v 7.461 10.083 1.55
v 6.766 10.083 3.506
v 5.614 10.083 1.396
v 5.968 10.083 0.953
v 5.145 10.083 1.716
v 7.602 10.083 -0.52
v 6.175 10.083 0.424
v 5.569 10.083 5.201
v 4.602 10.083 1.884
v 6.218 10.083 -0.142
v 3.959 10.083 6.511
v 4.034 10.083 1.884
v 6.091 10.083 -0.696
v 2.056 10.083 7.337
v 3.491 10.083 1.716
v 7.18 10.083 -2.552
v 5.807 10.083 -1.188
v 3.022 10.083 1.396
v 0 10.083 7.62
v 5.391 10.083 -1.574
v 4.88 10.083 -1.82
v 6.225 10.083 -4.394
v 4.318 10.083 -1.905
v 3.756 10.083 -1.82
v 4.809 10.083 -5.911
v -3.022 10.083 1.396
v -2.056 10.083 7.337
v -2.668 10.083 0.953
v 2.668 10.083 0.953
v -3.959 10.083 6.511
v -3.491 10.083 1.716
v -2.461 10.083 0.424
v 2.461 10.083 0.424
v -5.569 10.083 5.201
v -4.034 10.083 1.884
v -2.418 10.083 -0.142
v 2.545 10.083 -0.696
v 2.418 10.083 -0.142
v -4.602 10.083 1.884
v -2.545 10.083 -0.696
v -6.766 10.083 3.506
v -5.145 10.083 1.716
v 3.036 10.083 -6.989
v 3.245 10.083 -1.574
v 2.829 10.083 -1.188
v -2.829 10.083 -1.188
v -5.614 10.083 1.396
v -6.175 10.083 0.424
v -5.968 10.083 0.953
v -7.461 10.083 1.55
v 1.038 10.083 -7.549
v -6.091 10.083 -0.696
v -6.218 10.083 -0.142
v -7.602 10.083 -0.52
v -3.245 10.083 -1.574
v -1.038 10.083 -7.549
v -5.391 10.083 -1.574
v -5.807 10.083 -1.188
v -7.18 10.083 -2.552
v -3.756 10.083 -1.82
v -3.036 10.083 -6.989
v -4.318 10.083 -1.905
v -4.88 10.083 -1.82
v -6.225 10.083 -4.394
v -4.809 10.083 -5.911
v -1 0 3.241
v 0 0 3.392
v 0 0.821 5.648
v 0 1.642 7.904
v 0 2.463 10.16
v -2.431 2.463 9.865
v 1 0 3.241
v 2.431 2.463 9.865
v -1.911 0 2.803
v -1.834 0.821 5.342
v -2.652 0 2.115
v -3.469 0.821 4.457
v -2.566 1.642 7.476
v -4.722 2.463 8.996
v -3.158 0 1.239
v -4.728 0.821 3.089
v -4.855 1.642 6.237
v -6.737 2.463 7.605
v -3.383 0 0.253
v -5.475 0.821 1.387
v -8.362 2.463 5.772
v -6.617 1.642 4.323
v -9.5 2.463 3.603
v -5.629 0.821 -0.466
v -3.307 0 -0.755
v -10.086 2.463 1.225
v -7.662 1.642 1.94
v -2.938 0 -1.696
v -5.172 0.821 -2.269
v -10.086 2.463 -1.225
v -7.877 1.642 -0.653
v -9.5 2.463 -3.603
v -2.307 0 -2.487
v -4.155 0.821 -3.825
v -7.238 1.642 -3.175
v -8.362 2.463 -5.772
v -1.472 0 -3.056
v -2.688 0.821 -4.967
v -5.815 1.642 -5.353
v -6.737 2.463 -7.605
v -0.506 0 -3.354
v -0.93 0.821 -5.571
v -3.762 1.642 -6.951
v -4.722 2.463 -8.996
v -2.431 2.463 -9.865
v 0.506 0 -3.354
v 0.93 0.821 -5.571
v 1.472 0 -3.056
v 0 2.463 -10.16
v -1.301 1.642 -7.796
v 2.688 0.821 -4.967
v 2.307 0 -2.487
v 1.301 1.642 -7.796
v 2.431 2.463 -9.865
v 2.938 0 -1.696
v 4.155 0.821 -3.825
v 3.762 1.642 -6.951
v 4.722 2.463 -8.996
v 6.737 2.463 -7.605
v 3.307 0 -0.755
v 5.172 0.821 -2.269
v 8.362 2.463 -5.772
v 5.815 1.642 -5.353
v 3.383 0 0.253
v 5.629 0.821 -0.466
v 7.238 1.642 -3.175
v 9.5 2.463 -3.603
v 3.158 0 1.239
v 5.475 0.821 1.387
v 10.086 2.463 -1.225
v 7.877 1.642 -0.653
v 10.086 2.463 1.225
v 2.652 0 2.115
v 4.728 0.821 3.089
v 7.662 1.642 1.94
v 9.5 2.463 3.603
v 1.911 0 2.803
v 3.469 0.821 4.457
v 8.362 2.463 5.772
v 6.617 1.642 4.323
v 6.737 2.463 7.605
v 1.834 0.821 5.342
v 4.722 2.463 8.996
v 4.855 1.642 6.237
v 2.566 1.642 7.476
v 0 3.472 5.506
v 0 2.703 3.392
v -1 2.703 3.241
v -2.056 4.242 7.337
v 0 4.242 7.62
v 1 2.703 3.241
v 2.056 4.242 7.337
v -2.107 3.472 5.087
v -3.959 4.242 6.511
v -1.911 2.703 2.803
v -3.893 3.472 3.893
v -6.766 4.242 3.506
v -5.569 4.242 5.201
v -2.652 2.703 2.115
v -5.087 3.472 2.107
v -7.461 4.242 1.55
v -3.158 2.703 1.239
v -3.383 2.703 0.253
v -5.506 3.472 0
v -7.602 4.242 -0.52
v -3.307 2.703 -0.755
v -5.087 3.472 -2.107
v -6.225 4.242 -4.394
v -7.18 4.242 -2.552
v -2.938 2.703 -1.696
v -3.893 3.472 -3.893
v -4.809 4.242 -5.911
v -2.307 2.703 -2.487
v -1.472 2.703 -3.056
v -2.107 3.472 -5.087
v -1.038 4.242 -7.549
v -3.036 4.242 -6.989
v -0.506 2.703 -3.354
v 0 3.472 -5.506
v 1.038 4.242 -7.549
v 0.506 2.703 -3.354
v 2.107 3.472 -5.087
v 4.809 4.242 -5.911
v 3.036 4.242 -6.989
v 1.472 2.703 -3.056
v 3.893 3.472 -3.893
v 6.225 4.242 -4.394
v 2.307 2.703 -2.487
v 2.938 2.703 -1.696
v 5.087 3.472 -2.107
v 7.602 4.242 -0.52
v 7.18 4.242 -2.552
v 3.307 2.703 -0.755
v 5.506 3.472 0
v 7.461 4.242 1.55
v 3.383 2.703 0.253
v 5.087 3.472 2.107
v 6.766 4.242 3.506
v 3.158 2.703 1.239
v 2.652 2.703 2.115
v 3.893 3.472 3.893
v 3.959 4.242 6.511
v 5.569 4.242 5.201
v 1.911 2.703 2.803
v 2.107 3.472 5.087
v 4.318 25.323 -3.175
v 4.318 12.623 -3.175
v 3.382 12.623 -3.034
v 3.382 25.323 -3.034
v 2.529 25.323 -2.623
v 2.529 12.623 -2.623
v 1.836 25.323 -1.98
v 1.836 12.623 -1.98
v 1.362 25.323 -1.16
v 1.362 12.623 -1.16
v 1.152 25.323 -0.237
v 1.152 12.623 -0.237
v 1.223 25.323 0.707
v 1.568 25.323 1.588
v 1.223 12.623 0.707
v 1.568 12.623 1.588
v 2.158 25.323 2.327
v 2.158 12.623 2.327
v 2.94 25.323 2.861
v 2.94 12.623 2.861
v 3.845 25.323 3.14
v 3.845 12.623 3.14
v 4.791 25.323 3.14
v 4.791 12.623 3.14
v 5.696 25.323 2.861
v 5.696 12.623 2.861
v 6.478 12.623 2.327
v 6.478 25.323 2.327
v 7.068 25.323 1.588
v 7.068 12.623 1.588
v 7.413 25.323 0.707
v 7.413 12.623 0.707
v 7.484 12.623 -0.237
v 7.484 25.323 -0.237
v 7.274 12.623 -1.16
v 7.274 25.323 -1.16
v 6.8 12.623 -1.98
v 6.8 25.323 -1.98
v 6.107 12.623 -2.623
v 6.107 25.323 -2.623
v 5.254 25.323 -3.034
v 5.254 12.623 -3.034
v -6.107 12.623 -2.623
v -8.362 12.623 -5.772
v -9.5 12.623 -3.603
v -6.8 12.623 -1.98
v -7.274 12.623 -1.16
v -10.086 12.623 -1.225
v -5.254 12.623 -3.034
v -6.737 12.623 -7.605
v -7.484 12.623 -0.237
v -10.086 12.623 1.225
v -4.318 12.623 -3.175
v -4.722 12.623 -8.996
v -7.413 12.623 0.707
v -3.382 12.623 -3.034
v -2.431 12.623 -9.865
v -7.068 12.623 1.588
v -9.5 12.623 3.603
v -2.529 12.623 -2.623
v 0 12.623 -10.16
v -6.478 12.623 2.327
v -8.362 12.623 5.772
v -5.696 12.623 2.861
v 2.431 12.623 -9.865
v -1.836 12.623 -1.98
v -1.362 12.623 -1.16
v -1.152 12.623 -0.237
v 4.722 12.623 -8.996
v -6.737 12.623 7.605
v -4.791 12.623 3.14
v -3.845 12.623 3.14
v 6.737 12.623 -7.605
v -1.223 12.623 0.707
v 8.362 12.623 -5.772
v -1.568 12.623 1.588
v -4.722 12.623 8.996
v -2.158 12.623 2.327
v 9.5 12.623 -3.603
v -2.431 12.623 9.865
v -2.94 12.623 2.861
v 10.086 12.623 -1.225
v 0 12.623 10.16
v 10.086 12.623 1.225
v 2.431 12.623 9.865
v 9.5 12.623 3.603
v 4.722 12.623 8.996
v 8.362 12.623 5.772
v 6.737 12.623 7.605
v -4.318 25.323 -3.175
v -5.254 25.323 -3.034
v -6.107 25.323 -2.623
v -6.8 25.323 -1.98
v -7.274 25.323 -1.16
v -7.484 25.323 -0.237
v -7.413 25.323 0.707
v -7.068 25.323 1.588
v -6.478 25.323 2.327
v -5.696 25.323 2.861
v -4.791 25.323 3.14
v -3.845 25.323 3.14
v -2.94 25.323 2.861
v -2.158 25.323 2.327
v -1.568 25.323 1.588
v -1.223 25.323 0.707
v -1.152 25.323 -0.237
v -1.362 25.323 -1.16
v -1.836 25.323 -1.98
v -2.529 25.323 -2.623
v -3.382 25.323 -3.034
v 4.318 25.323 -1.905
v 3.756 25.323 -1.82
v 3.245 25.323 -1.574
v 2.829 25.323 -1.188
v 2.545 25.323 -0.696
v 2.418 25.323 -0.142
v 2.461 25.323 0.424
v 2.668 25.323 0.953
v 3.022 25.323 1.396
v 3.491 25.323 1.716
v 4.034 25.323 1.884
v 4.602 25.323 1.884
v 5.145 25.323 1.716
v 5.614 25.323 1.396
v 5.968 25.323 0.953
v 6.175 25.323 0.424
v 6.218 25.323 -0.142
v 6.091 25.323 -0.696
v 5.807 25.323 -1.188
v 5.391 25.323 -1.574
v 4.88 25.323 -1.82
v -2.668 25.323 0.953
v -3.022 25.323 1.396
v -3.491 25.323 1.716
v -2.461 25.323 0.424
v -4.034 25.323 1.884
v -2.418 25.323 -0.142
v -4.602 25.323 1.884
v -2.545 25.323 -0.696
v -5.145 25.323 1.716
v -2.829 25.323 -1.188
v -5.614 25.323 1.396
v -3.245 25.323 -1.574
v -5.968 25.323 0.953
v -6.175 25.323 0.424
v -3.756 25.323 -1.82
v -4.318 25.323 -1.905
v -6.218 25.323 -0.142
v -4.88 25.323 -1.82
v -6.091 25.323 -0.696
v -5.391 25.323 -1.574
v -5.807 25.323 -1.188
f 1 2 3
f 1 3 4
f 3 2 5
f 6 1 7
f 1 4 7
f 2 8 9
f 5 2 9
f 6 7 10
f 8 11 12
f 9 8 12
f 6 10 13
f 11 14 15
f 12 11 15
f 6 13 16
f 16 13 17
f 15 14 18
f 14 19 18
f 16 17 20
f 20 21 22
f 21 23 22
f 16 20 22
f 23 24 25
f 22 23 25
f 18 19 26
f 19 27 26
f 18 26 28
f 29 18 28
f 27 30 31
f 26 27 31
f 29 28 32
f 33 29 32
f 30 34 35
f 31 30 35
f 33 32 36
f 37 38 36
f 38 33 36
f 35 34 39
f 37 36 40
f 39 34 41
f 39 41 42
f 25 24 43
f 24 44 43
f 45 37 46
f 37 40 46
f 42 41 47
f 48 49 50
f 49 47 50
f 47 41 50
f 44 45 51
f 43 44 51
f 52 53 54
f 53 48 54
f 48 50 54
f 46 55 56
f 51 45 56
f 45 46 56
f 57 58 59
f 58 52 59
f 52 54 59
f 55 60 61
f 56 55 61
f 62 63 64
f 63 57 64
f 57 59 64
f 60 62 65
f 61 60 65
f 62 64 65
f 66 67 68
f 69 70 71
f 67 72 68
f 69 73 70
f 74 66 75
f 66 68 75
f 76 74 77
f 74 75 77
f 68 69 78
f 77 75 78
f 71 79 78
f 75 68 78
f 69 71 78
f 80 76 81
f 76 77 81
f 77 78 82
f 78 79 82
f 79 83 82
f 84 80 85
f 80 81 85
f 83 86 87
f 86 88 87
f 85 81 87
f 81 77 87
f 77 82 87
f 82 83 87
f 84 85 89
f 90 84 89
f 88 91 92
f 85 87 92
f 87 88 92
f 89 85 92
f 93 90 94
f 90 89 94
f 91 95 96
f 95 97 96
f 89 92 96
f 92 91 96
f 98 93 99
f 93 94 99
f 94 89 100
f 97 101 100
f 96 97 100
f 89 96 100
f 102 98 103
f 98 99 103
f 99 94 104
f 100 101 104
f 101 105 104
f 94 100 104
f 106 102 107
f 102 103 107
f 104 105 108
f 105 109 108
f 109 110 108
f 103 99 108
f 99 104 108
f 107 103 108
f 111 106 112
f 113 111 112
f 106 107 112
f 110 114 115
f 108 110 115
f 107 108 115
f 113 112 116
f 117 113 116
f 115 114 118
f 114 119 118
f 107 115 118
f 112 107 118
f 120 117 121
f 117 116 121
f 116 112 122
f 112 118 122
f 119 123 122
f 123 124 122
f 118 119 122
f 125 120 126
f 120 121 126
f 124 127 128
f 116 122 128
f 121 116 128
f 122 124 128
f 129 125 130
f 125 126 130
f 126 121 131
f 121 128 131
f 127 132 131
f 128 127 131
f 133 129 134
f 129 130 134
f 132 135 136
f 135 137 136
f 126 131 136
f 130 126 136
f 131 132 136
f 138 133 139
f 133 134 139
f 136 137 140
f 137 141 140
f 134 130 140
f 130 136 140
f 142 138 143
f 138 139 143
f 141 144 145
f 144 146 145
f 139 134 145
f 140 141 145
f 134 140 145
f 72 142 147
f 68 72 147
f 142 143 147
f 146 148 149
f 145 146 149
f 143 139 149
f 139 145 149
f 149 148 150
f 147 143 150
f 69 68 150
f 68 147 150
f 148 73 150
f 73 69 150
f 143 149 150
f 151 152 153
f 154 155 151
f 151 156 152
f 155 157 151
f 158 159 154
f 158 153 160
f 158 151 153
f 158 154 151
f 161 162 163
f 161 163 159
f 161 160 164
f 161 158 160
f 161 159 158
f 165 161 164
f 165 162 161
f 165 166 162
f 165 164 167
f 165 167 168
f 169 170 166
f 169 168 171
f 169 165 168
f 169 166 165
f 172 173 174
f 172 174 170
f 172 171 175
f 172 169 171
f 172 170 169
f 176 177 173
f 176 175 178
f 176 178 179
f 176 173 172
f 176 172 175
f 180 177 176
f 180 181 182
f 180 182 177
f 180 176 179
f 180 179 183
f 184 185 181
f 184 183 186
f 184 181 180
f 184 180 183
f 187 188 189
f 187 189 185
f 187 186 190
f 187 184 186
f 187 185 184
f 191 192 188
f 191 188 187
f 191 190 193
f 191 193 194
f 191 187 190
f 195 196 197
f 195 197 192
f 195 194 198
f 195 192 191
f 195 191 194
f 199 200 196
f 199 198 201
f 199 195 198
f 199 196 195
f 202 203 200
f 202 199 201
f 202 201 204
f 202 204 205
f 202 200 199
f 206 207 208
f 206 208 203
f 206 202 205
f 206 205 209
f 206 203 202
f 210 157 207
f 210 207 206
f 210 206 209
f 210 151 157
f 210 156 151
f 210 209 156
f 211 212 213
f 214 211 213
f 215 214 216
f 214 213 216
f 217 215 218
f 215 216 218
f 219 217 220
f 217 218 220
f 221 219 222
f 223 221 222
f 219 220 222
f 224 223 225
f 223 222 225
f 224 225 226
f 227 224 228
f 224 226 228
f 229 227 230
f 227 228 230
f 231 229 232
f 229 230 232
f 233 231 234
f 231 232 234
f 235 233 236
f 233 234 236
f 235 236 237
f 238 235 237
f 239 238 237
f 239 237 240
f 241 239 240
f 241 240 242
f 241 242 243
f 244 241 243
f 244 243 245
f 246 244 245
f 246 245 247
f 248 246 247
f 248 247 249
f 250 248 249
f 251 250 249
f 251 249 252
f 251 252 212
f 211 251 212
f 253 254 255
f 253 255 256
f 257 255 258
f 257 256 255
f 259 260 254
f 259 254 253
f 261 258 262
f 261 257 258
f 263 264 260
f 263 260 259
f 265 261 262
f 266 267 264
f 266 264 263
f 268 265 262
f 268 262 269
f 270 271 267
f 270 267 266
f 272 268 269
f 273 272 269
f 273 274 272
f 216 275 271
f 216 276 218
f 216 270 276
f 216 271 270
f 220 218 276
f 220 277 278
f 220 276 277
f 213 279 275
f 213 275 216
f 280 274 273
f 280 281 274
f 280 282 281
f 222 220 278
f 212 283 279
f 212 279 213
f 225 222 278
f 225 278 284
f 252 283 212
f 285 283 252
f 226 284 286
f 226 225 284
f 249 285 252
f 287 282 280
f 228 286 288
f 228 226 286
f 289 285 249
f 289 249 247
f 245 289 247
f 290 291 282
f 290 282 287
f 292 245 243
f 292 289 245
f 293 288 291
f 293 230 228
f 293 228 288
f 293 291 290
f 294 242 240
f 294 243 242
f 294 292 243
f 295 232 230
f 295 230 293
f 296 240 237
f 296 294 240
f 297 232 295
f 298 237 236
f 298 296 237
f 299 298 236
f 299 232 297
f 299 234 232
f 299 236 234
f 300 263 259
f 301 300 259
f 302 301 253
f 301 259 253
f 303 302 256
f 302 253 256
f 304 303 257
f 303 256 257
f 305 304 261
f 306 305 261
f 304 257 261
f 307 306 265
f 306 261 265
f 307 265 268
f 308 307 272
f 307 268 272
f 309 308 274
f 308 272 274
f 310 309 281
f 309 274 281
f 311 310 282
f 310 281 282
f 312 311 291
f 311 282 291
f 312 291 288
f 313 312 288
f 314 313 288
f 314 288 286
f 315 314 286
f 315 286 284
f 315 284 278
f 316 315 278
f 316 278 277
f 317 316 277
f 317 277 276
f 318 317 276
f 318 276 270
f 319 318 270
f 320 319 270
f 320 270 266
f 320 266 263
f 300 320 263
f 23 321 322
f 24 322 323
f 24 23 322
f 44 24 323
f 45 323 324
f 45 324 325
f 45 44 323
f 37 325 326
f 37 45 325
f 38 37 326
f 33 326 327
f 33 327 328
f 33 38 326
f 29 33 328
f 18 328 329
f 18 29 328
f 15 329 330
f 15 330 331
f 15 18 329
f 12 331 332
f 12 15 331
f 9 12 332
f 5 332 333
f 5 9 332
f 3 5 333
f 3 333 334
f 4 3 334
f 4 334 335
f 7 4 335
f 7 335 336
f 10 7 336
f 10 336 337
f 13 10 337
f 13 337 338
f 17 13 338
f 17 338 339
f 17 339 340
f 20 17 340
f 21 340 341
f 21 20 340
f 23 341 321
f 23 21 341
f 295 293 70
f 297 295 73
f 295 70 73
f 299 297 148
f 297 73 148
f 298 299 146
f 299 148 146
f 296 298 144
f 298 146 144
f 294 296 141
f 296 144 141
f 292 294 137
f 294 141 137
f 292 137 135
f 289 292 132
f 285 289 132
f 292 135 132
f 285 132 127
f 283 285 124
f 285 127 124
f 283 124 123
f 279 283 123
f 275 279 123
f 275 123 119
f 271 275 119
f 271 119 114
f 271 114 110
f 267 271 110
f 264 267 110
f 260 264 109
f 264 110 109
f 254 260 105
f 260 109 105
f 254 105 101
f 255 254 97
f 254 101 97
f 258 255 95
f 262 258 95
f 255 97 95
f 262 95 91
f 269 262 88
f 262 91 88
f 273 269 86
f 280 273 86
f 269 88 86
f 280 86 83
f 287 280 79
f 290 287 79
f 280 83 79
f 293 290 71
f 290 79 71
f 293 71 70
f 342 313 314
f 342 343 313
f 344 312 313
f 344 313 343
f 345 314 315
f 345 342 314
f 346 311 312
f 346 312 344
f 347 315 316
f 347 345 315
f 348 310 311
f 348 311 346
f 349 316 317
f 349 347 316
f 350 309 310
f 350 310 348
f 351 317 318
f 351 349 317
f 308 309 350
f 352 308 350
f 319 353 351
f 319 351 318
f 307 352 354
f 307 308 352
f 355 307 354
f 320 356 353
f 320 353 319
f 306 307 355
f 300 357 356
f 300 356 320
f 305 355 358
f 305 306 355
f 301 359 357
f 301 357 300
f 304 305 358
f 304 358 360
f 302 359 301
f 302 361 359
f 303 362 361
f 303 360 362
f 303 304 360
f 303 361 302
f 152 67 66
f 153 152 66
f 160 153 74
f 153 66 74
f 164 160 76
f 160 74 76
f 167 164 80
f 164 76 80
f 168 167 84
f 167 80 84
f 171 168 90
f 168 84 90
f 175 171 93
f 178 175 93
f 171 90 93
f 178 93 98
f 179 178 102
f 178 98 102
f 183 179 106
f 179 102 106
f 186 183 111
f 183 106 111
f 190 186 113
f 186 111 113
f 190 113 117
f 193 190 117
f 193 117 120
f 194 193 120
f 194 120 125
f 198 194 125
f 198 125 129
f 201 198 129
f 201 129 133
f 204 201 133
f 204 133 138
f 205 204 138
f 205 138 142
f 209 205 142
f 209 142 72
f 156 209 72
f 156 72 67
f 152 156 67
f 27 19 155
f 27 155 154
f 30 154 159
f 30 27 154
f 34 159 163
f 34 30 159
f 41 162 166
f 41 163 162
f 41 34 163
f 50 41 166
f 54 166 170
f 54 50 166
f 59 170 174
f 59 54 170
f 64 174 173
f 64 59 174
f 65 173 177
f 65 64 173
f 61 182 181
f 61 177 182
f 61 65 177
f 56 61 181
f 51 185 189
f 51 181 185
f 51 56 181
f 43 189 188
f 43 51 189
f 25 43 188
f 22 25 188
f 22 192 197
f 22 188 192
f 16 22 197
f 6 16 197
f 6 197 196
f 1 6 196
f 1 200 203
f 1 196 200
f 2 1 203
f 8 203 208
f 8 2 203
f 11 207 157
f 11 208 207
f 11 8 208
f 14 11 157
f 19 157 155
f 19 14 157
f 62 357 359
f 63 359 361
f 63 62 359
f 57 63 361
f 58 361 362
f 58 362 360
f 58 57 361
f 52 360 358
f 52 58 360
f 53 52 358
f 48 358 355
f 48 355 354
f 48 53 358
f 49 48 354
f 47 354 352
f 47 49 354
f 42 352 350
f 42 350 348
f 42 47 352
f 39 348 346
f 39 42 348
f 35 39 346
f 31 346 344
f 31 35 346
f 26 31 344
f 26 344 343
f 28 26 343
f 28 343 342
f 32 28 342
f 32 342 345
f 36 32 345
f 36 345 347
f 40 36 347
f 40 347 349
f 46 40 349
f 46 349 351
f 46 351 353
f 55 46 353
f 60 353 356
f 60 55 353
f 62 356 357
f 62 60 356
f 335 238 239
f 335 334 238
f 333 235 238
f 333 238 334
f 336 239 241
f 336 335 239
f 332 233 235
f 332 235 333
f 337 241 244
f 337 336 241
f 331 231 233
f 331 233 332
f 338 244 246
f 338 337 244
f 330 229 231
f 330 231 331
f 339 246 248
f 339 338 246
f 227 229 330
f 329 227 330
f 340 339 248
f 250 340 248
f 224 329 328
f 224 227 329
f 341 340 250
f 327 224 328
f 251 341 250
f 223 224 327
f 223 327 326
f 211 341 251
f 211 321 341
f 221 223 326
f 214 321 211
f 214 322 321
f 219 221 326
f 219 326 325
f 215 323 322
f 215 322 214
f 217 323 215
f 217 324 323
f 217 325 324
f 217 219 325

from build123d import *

# Parameters (mm, degrees)
SHELL1_T              = -2.54
SKETCH5_R             = 3.175
SKETCH5_R_2           = 1.905
BOSS_EXTRUDE1_DEPTH   = 15.24
BOSS_EXTRUDE1_2_DEPTH = 15.24
CUT_EXTRUDE1_REACH    = 31.116
SKETCH6_R             = 3.392080707
SKETCH7_R             = 10.16
SKETCH7_R_2           = 3.175
BOSS_EXTRUDE2_DEPTH   = 2.54


with BuildPart() as part:
    # Sketch4 → Revolve1 (revolve)
    with BuildSketch(Plane(origin=(0, 0, 0), x_dir=(0, 0, -1), z_dir=(1, 0, 0))):
        Polygon((0, 0), (-3.392080707, 0), (-10.16, 2.463321171), (-10.16, 10.083321171), (0, 10.083321171), align=None)
    revolve(axis=Axis((0, 10.083321171, 0), (0, -1, 0)))

    # Shell1
    shell1_openings = [part.faces().sort_by_distance(p)[0] for p in [
        (0, 10.083321171, 0),
    ]]
    offset(amount=SHELL1_T, openings=shell1_openings, kind=Kind.INTERSECTION)

    # Cut-Extrude1: up to this cone (the profile starts outside it)
    cut_extrude1_end = Plane(origin=(0, 0, 0), z_dir=(0, 1, 0)).offset(1.468396133) * Cone(2.747e-06, 82.829863624, 30.147603867, align=(Align.CENTER, Align.CENTER, Align.MIN), mode=Mode.PRIVATE)
    # Sketch6 → Cut-Extrude1 (cut, up to the surface)
    with BuildSketch(Plane.XZ, mode=Mode.PRIVATE) as cut_extrude1_sk1:
        with Locations(Location((0, 0, 0), (0, 0, 90))):
            Circle(SKETCH6_R)
    cut_extrude1_tool1 = extrude(cut_extrude1_sk1.sketch, amount=-CUT_EXTRUDE1_REACH, mode=Mode.PRIVATE) - cut_extrude1_end
    add(cut_extrude1_tool1.solids().sort_by_distance((0, 0, 0))[0], mode=Mode.SUBTRACT)


with BuildPart() as body_2:
    # Sketch5 → Boss-Extrude1 (new body)
    with BuildSketch(Plane(origin=(0, 10.083321171, 0), x_dir=(1, 0, 0), z_dir=(0, 1, 0))):
        with Locations(Location((-4.318, 0, 0), (0, 0, 90))):
            Circle(SKETCH5_R)
        with Locations(Location((-4.318, 0, 0), (0, 0, 90))):
            Circle(SKETCH5_R_2, mode=Mode.SUBTRACT)
    extrude(amount=BOSS_EXTRUDE1_DEPTH)



with BuildPart() as body_3:
    # Sketch5 → Boss-Extrude1 2 (new body)
    with BuildSketch(Plane(origin=(0, 10.083321171, 0), x_dir=(1, 0, 0), z_dir=(0, 1, 0))):
        with Locations(Location((4.318, 0, 0), (0, 0, 90))):
            Circle(SKETCH5_R)
        with Locations(Location((4.318, 0, 0), (0, 0, 90))):
            Circle(SKETCH5_R_2, mode=Mode.SUBTRACT)
    extrude(amount=BOSS_EXTRUDE1_2_DEPTH)


with BuildPart() as cut_extrude1_kept_piece:
    # of the separate pieces the step leaves, the one the design keeps (cut_extrude1_pieces_kept)
    add(part.part.solids().sort_by_distance((0, 0, 3.392080707))[0])


with BuildPart() as body_2_1:
    add(body_2.part)

    add(body_3.part)  # Boss-Extrude2 merges body 3

    add(cut_extrude1_kept_piece.part)  # Boss-Extrude2 merges Cut-Extrude1 kept piece
    # Sketch7 → Boss-Extrude2 (add)
    with BuildSketch(Plane(origin=(0, 10.083321171, 0), x_dir=(1, 0, 0), z_dir=(0, 1, 0))):
        with Locations(Location((0, 0, 0), (0, 0, 270))):
            Circle(SKETCH7_R)
        with Locations(Location((-4.318, 0, 0), (0, 0, 90))):
            Circle(SKETCH7_R_2, mode=Mode.SUBTRACT)
        with Locations(Location((4.318, 0, 0), (0, 0, 90))):
            Circle(SKETCH7_R_2, mode=Mode.SUBTRACT)
    extrude(amount=BOSS_EXTRUDE2_DEPTH)


solid = body_2_1.part
